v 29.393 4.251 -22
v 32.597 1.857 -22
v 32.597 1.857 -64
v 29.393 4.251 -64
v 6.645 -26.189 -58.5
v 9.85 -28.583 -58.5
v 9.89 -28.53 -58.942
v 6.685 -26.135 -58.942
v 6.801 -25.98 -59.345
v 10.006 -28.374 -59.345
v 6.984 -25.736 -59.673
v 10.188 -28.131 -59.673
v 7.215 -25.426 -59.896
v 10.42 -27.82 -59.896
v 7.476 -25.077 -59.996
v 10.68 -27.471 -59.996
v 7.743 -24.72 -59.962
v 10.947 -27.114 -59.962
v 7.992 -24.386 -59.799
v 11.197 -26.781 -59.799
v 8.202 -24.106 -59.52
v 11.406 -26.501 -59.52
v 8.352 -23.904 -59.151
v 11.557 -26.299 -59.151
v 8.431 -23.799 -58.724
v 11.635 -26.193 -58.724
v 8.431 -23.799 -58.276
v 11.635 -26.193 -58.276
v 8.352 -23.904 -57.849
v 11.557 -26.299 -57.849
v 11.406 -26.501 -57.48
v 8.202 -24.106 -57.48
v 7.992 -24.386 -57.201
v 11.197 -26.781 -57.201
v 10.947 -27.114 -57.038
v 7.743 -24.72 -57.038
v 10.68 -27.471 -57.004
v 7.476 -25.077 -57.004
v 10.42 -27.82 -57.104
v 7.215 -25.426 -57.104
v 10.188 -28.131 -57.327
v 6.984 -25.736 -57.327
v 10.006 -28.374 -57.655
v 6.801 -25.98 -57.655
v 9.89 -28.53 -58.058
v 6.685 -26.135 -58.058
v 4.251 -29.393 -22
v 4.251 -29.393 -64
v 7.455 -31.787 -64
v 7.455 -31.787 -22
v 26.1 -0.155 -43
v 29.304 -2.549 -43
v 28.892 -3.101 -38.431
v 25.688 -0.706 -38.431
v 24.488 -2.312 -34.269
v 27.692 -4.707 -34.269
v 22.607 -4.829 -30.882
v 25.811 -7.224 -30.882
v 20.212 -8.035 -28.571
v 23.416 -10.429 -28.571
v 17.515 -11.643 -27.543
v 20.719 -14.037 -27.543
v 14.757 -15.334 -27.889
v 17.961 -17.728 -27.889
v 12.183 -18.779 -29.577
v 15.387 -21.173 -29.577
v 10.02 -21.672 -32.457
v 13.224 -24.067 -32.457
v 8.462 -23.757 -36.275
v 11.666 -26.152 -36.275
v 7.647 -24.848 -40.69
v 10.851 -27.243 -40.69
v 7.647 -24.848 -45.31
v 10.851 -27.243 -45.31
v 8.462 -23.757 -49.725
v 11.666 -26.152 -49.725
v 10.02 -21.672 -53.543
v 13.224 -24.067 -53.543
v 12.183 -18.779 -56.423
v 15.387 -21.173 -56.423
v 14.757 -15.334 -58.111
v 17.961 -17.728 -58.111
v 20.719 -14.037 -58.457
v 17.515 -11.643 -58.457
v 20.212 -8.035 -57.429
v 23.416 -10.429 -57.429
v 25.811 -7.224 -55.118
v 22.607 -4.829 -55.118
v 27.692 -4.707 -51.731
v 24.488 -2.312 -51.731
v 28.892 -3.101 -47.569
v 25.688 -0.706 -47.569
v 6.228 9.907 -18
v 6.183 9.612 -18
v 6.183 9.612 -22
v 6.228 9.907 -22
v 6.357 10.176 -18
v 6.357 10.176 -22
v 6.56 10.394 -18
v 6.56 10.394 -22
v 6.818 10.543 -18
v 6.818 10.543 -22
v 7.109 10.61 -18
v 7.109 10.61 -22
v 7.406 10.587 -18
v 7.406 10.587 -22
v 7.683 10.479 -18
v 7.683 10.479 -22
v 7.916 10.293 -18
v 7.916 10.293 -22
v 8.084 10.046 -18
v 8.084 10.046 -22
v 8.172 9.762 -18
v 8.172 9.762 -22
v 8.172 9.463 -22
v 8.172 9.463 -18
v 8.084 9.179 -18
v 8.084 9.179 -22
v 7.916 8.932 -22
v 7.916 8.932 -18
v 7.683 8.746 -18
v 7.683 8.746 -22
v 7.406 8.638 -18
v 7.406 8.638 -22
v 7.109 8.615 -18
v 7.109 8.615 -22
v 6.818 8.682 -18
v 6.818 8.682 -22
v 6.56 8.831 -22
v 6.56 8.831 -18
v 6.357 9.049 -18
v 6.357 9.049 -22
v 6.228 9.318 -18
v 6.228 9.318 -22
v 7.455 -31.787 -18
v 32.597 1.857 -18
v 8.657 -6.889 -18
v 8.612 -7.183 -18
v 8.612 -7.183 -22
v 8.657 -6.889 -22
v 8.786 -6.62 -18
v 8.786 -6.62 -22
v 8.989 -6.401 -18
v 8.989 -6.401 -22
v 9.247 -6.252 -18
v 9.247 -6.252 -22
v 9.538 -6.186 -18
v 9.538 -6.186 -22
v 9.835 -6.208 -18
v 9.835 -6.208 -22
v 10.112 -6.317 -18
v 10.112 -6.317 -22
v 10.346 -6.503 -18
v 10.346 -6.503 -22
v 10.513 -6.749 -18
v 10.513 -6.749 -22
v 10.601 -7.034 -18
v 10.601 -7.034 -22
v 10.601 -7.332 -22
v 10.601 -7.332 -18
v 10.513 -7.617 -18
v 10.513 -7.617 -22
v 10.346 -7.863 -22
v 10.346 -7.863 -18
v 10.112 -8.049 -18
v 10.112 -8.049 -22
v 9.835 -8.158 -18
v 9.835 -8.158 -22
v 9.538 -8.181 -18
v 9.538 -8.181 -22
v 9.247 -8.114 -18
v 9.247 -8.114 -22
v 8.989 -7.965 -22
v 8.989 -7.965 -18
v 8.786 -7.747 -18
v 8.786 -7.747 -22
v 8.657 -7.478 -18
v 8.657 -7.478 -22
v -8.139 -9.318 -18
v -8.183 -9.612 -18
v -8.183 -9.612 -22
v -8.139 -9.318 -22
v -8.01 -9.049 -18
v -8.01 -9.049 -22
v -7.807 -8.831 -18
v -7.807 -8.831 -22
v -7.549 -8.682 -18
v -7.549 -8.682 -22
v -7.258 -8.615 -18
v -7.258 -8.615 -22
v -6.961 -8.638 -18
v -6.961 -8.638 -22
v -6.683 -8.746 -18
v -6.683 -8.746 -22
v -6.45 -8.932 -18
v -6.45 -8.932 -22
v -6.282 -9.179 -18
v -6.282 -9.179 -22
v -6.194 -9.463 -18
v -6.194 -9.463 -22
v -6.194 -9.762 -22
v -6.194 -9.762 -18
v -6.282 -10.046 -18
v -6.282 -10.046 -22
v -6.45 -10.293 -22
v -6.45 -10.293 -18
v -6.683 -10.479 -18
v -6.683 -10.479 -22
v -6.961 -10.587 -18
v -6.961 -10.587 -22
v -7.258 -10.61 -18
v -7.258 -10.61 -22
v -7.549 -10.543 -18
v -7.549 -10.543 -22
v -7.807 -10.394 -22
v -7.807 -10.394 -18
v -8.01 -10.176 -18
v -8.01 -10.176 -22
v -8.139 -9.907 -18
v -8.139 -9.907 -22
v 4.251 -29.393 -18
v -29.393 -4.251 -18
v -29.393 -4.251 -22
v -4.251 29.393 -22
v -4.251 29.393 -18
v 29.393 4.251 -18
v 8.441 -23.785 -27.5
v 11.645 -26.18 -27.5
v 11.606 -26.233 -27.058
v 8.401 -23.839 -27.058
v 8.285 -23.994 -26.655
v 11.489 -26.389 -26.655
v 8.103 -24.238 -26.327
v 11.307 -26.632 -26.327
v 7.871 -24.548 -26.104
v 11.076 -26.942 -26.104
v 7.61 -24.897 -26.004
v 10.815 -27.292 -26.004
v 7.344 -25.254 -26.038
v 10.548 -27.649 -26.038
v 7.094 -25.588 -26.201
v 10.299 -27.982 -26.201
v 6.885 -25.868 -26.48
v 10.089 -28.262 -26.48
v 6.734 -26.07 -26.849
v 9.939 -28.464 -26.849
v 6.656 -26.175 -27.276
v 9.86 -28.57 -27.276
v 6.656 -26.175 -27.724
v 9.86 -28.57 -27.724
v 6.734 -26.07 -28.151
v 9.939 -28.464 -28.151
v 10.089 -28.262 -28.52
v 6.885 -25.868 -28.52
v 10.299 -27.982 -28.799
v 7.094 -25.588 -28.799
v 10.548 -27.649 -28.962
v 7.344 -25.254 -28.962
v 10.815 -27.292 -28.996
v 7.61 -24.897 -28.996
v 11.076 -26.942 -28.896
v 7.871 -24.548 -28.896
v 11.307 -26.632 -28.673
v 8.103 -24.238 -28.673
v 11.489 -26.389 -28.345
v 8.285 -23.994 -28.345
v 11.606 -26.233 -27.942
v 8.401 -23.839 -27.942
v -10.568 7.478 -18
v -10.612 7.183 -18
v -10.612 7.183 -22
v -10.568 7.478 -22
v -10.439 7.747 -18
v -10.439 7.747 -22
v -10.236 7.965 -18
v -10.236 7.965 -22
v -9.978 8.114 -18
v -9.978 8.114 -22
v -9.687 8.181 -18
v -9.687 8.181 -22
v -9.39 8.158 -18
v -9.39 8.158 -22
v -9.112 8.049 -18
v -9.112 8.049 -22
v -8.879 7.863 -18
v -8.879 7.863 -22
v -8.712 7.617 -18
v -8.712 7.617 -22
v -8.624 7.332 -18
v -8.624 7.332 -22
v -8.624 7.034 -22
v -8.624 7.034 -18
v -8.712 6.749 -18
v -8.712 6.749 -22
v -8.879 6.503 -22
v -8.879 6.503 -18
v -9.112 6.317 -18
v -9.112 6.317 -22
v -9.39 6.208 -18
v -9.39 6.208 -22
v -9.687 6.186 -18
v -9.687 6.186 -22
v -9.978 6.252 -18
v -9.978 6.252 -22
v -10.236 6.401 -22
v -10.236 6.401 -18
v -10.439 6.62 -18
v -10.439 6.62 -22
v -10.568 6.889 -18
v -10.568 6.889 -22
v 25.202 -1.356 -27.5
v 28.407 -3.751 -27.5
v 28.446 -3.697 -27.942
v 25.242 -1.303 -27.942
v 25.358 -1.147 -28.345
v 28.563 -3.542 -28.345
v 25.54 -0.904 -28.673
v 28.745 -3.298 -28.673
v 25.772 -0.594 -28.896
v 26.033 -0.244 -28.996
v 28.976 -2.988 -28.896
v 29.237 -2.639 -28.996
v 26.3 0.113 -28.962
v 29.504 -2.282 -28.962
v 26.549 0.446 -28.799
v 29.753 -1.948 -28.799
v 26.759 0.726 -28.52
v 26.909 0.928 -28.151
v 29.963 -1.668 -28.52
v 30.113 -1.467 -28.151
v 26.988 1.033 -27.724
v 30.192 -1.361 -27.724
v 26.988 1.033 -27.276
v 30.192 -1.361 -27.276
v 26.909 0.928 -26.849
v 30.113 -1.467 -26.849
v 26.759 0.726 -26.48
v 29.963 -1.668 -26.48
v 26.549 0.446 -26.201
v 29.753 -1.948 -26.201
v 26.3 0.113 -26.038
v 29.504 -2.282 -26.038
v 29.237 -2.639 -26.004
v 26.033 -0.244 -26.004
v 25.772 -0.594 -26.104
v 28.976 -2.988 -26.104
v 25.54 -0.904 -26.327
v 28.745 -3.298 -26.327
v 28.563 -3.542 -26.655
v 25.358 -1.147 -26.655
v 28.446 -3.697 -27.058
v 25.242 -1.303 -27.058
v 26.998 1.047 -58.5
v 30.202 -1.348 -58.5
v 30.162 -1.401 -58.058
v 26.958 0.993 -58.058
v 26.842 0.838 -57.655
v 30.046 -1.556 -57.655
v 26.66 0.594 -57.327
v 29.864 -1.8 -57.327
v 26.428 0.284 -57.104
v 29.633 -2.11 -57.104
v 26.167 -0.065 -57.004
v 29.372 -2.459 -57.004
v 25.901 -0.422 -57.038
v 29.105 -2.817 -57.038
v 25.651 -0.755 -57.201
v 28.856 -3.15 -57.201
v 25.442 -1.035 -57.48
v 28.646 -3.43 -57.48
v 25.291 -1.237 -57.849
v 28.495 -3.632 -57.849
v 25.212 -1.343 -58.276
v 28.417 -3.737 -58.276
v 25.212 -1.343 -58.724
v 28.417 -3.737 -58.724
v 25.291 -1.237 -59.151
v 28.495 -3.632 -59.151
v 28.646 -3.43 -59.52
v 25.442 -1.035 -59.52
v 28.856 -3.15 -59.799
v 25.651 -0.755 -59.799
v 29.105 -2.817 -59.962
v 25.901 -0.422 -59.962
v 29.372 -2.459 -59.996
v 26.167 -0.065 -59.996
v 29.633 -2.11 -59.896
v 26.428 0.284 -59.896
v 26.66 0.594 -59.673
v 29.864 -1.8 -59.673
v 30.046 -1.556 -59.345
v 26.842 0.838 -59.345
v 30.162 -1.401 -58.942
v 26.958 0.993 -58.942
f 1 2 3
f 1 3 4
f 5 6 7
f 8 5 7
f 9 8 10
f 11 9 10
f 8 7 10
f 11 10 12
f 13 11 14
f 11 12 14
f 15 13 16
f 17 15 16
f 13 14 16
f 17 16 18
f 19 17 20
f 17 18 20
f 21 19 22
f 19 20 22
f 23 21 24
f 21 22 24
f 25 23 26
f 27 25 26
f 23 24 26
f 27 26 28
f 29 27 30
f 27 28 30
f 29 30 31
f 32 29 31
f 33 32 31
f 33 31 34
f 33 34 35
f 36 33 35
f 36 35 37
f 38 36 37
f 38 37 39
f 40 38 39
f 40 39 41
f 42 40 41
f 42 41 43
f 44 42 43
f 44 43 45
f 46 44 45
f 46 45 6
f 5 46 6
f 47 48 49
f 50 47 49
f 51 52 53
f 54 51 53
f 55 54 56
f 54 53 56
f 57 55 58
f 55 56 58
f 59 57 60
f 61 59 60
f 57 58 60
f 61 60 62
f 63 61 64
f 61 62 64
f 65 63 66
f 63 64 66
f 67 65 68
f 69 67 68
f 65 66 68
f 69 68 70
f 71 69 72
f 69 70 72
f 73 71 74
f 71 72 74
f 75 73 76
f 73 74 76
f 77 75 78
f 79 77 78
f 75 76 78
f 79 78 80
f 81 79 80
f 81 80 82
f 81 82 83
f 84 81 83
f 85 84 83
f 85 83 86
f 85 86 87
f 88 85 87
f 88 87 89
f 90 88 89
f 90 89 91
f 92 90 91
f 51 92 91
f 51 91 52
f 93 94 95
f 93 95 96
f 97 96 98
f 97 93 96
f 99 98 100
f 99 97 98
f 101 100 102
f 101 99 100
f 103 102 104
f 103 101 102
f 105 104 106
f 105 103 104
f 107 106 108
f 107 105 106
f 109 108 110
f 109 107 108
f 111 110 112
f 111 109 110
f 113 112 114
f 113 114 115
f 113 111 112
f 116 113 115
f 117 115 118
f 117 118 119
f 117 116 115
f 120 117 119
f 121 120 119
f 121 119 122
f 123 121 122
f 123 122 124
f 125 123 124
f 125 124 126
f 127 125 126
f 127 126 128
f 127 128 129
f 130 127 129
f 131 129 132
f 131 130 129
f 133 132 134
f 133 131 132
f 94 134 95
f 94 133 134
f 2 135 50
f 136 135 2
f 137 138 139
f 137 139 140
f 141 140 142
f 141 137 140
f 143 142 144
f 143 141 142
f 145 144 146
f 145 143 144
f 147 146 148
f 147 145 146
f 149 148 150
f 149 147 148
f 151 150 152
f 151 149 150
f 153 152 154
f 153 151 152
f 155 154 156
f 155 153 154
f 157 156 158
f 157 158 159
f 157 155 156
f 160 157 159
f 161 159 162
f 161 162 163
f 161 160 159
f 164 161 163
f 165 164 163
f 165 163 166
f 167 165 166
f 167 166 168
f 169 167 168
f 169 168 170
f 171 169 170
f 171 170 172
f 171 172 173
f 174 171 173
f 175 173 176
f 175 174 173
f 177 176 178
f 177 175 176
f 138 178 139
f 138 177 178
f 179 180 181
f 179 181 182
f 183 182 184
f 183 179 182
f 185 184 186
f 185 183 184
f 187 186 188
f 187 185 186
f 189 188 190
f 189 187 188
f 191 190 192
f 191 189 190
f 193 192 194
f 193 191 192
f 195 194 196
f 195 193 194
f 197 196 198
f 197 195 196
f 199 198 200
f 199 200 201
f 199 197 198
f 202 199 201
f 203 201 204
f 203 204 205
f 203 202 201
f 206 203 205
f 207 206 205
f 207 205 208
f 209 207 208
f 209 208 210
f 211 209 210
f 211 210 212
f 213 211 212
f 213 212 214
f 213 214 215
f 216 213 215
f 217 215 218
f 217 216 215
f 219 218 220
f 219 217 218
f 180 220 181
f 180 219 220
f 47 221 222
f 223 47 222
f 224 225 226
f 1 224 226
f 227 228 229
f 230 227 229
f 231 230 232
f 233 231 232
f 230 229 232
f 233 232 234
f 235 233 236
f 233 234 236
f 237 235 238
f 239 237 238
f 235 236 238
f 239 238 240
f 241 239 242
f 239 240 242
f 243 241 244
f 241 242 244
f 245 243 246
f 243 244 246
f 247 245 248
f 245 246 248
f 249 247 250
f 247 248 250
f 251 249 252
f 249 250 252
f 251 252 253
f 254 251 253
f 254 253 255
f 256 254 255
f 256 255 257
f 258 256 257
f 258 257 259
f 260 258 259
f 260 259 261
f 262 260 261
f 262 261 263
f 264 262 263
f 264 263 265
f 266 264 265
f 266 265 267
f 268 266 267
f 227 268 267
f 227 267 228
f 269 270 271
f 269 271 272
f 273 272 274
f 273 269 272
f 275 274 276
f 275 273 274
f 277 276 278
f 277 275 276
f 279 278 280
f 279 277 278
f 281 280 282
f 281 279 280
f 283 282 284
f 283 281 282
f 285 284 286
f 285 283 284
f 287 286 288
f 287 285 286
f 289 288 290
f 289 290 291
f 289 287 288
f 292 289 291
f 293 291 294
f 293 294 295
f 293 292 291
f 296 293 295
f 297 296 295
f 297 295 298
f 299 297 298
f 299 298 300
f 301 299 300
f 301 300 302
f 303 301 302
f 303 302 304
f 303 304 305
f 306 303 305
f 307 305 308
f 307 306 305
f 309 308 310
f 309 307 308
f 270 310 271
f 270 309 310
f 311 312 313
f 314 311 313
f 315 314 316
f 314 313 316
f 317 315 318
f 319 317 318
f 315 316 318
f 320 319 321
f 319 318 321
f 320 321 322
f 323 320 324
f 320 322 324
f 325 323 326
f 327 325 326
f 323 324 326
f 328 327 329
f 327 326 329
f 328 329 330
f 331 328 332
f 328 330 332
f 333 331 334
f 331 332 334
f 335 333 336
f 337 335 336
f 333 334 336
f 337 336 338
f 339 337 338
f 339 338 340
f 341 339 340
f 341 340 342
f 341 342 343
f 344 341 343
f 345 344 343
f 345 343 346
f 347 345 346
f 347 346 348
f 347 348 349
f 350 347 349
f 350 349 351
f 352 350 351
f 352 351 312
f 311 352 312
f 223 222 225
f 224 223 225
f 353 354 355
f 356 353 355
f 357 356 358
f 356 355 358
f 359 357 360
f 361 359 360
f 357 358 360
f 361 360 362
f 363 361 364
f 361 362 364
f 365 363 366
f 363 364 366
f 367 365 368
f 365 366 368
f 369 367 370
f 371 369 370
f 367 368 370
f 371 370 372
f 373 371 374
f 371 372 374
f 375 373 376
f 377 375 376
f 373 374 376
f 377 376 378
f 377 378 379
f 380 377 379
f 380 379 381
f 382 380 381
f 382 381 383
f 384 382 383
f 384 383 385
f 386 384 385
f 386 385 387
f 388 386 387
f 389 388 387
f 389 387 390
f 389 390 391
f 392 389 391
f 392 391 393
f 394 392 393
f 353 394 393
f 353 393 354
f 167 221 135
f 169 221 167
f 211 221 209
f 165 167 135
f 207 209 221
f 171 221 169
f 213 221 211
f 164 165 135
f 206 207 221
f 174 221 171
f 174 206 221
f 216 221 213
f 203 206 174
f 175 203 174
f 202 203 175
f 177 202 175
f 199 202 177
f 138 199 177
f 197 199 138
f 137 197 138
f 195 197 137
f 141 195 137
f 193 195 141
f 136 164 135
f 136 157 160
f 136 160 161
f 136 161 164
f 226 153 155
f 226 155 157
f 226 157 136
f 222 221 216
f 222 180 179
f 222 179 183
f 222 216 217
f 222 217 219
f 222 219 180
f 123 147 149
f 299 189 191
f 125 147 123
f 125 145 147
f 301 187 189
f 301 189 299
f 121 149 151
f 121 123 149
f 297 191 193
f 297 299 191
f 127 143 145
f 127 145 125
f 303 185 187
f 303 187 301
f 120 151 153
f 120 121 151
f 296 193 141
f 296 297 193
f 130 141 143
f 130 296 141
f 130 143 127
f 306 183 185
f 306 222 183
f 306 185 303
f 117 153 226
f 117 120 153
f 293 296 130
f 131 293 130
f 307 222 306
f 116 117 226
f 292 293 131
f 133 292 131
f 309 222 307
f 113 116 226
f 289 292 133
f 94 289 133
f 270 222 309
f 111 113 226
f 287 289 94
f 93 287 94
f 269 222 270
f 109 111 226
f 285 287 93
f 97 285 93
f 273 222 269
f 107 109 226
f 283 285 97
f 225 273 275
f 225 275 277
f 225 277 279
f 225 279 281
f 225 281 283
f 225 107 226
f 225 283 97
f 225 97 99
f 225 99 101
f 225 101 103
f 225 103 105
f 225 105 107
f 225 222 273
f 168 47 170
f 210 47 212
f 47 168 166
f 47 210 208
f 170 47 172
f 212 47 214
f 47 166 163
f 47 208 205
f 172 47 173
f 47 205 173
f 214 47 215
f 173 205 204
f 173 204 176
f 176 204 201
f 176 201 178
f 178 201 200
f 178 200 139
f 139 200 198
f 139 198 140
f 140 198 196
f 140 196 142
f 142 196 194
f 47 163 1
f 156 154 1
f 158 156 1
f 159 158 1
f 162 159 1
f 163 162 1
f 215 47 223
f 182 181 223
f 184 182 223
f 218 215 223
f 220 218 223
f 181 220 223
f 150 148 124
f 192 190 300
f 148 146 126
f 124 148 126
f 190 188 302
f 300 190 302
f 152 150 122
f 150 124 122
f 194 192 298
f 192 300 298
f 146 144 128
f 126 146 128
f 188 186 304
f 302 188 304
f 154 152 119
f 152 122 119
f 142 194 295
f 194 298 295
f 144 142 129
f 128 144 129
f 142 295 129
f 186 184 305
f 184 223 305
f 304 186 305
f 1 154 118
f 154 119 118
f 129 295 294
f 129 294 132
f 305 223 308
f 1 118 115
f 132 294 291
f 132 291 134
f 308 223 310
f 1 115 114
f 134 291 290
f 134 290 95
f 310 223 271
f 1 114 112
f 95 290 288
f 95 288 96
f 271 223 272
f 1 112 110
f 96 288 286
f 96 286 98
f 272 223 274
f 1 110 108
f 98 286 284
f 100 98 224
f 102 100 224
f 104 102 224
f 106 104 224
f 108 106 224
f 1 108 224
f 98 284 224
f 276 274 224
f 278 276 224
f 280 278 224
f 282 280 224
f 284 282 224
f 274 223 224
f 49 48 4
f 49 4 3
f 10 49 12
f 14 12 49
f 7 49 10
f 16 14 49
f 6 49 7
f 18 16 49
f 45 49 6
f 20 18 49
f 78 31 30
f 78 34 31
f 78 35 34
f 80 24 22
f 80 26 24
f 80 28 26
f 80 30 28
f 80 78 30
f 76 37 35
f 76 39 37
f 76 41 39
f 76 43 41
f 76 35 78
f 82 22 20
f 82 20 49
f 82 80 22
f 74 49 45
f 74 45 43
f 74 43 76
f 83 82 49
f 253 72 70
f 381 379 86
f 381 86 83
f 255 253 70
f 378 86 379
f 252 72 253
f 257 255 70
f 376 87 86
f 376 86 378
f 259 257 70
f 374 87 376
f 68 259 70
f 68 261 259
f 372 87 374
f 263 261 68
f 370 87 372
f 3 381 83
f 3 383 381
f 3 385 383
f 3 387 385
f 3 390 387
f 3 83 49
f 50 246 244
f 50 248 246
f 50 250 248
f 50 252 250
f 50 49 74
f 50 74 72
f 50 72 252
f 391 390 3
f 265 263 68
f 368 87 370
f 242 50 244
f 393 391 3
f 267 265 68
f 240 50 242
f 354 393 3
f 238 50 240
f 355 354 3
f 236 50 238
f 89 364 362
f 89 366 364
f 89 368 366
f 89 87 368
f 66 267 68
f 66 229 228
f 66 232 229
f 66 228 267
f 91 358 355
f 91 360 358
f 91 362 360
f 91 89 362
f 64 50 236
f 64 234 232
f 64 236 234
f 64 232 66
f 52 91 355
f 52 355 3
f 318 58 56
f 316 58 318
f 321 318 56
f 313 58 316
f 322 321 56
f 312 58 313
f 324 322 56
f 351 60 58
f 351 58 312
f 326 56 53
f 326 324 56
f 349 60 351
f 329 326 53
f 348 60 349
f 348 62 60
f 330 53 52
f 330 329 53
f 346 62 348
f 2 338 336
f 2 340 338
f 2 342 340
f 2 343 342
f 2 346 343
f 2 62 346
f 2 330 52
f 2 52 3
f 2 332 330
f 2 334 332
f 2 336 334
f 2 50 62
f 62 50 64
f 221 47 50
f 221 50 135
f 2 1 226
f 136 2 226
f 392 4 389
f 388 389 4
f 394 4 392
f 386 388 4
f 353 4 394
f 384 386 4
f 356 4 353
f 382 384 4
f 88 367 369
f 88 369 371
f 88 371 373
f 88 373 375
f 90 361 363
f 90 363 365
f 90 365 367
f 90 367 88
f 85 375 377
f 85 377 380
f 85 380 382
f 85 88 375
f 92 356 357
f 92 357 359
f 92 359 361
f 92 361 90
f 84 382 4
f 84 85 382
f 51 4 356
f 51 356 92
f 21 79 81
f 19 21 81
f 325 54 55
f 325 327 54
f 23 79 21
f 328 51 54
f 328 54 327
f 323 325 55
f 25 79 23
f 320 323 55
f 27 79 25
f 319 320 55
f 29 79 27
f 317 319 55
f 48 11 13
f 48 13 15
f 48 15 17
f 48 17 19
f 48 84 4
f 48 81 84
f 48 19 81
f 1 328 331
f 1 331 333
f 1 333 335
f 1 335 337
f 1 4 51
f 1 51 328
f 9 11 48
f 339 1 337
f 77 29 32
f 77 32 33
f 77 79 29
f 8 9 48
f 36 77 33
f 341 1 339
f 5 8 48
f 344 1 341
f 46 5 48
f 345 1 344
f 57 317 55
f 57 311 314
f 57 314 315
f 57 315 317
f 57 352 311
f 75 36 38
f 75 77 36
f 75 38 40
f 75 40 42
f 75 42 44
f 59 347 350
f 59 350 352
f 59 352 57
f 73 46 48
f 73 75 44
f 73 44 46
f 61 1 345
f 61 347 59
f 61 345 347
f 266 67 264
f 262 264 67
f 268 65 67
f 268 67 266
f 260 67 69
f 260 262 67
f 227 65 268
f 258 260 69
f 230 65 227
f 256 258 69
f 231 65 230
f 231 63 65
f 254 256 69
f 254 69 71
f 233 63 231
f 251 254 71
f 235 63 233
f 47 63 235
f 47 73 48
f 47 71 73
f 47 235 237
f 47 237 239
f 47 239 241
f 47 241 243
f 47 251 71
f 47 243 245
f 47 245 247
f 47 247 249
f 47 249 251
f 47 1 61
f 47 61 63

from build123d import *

# Parameters (mm, degrees)
SKETCH_2_R          = 1
EXTRUDE_1_DEPTH     = 4
SKETCH_5_W          = 42
SKETCH_5_H          = 4
EXTRUDE_2_DEPTH     = 4
EXTRUDE_3_DEPTH     = 42
CUT_EXTRUDE_1_REACH = 94.227
SKETCH_7_R          = 15.5
CUT_EXTRUDE_2_REACH = 94.227
SKETCH_9_R          = 1.5


with BuildPart() as part:
    # 草图2 → 凸台-拉伸1 (new body)
    with BuildSketch(Plane(origin=(0, 0, -18), x_dir=(-1, 0, 0), z_dir=(0, 0, -1))):
        Polygon((-4.251031416, -29.392664593), (29.392664593, -4.251031416), (4.251031416, 29.392664593), (-29.392664593, 4.251031416), align=None)
        with Locations((9.612484574, 7.183323765)):
            Circle(SKETCH_2_R, mode=Mode.SUBTRACT)
        with Locations((-7.183323765, 9.612484574)):
            Circle(SKETCH_2_R, mode=Mode.SUBTRACT)
        with Locations((-9.612484574, -7.183323765)):
            Circle(SKETCH_2_R, mode=Mode.SUBTRACT)
        with Locations((7.183323765, -9.612484574)):
            Circle(SKETCH_2_R, mode=Mode.SUBTRACT)
    extrude(amount=EXTRUDE_1_DEPTH)

    # 草图5 → 凸台-拉伸2 (add)
    with BuildSketch(Plane(origin=(16.821848005, -12.570816589, 0), x_dir=(0.5986103137395574, 0.8010403811822651, 0), z_dir=(0.8010403811822651, -0.5986103137395574, 0))):
        with Locations((0, -20)):
            Rectangle(SKETCH_5_W, SKETCH_5_H)
    extrude(amount=EXTRUDE_2_DEPTH)

    # 草图6 → 凸台-拉伸3 (add)
    with BuildSketch(Plane(origin=(0, 0, -22), x_dir=(-1, 0, 0), z_dir=(0, 0, -1))):
        Polygon((-7.455192941, -31.787105848), (-32.596826118, 1.856590161), (-29.392664593, 4.251031416), (-4.251031416, -29.392664593), align=None)
    extrude(amount=EXTRUDE_3_DEPTH)

    # 草图7 → 切除-拉伸1 (cut, up to next)
    with BuildSketch(Plane(origin=(20.02600953, -14.965257843, 0), x_dir=(-0.5986103137395574, -0.8010403811822653, 0), z_dir=(0.8010403811822653, -0.5986103137395574, 0)), mode=Mode.PRIVATE) as cut_extrude_1_sk1:
        with Locations(Location((0, 43, 0), (0, 0, 180))):
            Circle(SKETCH_7_R)
    cut_extrude_1_tool1 = extrude(cut_extrude_1_sk1.sketch, amount=-CUT_EXTRUDE_1_REACH, mode=Mode.PRIVATE) & part.part
    add(cut_extrude_1_tool1.solids().sort_by_distance((20.02601, -14.965258, -43))[0], mode=Mode.SUBTRACT)

    # 草图9 → 切除-拉伸2 (cut, up to next)
    with BuildSketch(Plane(origin=(20.02600953, -14.965257843, 0), x_dir=(-0.5986103137395573, -0.8010403811822652, 0), z_dir=(0.8010403811822653, -0.5986103137395574, 0)), mode=Mode.PRIVATE) as cut_extrude_2_sk1:
        with Locations(Location((-15.5, 58.5, 0), (0, 0, 180))):
            Circle(SKETCH_9_R)
    cut_extrude_2_tool1 = extrude(cut_extrude_2_sk1.sketch, amount=-CUT_EXTRUDE_2_REACH, mode=Mode.PRIVATE) & part.part
    # 草图9 → 切除-拉伸2 (cut, up to next)
    with BuildSketch(Plane(origin=(20.02600953, -14.965257843, 0), x_dir=(-0.5986103137395573, -0.8010403811822652, 0), z_dir=(0.8010403811822653, -0.5986103137395574, 0)), mode=Mode.PRIVATE) as cut_extrude_2_sk2:
        with Locations((-15.5, 27.5)):
            Circle(SKETCH_9_R)
    cut_extrude_2_tool2 = extrude(cut_extrude_2_sk2.sketch, amount=-CUT_EXTRUDE_2_REACH, mode=Mode.PRIVATE) & part.part
    # 草图9 → 切除-拉伸2 (cut, up to next)
    with BuildSketch(Plane(origin=(20.02600953, -14.965257843, 0), x_dir=(-0.5986103137395573, -0.8010403811822652, 0), z_dir=(0.8010403811822653, -0.5986103137395574, 0)), mode=Mode.PRIVATE) as cut_extrude_2_sk3:
        with Locations((15.5, 58.5)):
            Circle(SKETCH_9_R)
    cut_extrude_2_tool3 = extrude(cut_extrude_2_sk3.sketch, amount=-CUT_EXTRUDE_2_REACH, mode=Mode.PRIVATE) & part.part
    # 草图9 → 切除-拉伸2 (cut, up to next)
    with BuildSketch(Plane(origin=(20.02600953, -14.965257843, 0), x_dir=(-0.5986103137395573, -0.8010403811822652, 0), z_dir=(0.8010403811822653, -0.5986103137395574, 0)), mode=Mode.PRIVATE) as cut_extrude_2_sk4:
        with Locations(Location((15.5, 27.5, 0), (0, 0, 180))):
            Circle(SKETCH_9_R)
    cut_extrude_2_tool4 = extrude(cut_extrude_2_sk4.sketch, amount=-CUT_EXTRUDE_2_REACH, mode=Mode.PRIVATE) & part.part
    add(cut_extrude_2_tool1.solids().sort_by_distance((29.304469, -2.549132, -58.5))[0], mode=Mode.SUBTRACT)
    add(cut_extrude_2_tool2.solids().sort_by_distance((29.304469, -2.549132, -27.5))[0], mode=Mode.SUBTRACT)
    add(cut_extrude_2_tool3.solids().sort_by_distance((10.74755, -27.381384, -58.5))[0], mode=Mode.SUBTRACT)
    add(cut_extrude_2_tool4.solids().sort_by_distance((10.74755, -27.381384, -27.5))[0], mode=Mode.SUBTRACT)


solid = part.part
